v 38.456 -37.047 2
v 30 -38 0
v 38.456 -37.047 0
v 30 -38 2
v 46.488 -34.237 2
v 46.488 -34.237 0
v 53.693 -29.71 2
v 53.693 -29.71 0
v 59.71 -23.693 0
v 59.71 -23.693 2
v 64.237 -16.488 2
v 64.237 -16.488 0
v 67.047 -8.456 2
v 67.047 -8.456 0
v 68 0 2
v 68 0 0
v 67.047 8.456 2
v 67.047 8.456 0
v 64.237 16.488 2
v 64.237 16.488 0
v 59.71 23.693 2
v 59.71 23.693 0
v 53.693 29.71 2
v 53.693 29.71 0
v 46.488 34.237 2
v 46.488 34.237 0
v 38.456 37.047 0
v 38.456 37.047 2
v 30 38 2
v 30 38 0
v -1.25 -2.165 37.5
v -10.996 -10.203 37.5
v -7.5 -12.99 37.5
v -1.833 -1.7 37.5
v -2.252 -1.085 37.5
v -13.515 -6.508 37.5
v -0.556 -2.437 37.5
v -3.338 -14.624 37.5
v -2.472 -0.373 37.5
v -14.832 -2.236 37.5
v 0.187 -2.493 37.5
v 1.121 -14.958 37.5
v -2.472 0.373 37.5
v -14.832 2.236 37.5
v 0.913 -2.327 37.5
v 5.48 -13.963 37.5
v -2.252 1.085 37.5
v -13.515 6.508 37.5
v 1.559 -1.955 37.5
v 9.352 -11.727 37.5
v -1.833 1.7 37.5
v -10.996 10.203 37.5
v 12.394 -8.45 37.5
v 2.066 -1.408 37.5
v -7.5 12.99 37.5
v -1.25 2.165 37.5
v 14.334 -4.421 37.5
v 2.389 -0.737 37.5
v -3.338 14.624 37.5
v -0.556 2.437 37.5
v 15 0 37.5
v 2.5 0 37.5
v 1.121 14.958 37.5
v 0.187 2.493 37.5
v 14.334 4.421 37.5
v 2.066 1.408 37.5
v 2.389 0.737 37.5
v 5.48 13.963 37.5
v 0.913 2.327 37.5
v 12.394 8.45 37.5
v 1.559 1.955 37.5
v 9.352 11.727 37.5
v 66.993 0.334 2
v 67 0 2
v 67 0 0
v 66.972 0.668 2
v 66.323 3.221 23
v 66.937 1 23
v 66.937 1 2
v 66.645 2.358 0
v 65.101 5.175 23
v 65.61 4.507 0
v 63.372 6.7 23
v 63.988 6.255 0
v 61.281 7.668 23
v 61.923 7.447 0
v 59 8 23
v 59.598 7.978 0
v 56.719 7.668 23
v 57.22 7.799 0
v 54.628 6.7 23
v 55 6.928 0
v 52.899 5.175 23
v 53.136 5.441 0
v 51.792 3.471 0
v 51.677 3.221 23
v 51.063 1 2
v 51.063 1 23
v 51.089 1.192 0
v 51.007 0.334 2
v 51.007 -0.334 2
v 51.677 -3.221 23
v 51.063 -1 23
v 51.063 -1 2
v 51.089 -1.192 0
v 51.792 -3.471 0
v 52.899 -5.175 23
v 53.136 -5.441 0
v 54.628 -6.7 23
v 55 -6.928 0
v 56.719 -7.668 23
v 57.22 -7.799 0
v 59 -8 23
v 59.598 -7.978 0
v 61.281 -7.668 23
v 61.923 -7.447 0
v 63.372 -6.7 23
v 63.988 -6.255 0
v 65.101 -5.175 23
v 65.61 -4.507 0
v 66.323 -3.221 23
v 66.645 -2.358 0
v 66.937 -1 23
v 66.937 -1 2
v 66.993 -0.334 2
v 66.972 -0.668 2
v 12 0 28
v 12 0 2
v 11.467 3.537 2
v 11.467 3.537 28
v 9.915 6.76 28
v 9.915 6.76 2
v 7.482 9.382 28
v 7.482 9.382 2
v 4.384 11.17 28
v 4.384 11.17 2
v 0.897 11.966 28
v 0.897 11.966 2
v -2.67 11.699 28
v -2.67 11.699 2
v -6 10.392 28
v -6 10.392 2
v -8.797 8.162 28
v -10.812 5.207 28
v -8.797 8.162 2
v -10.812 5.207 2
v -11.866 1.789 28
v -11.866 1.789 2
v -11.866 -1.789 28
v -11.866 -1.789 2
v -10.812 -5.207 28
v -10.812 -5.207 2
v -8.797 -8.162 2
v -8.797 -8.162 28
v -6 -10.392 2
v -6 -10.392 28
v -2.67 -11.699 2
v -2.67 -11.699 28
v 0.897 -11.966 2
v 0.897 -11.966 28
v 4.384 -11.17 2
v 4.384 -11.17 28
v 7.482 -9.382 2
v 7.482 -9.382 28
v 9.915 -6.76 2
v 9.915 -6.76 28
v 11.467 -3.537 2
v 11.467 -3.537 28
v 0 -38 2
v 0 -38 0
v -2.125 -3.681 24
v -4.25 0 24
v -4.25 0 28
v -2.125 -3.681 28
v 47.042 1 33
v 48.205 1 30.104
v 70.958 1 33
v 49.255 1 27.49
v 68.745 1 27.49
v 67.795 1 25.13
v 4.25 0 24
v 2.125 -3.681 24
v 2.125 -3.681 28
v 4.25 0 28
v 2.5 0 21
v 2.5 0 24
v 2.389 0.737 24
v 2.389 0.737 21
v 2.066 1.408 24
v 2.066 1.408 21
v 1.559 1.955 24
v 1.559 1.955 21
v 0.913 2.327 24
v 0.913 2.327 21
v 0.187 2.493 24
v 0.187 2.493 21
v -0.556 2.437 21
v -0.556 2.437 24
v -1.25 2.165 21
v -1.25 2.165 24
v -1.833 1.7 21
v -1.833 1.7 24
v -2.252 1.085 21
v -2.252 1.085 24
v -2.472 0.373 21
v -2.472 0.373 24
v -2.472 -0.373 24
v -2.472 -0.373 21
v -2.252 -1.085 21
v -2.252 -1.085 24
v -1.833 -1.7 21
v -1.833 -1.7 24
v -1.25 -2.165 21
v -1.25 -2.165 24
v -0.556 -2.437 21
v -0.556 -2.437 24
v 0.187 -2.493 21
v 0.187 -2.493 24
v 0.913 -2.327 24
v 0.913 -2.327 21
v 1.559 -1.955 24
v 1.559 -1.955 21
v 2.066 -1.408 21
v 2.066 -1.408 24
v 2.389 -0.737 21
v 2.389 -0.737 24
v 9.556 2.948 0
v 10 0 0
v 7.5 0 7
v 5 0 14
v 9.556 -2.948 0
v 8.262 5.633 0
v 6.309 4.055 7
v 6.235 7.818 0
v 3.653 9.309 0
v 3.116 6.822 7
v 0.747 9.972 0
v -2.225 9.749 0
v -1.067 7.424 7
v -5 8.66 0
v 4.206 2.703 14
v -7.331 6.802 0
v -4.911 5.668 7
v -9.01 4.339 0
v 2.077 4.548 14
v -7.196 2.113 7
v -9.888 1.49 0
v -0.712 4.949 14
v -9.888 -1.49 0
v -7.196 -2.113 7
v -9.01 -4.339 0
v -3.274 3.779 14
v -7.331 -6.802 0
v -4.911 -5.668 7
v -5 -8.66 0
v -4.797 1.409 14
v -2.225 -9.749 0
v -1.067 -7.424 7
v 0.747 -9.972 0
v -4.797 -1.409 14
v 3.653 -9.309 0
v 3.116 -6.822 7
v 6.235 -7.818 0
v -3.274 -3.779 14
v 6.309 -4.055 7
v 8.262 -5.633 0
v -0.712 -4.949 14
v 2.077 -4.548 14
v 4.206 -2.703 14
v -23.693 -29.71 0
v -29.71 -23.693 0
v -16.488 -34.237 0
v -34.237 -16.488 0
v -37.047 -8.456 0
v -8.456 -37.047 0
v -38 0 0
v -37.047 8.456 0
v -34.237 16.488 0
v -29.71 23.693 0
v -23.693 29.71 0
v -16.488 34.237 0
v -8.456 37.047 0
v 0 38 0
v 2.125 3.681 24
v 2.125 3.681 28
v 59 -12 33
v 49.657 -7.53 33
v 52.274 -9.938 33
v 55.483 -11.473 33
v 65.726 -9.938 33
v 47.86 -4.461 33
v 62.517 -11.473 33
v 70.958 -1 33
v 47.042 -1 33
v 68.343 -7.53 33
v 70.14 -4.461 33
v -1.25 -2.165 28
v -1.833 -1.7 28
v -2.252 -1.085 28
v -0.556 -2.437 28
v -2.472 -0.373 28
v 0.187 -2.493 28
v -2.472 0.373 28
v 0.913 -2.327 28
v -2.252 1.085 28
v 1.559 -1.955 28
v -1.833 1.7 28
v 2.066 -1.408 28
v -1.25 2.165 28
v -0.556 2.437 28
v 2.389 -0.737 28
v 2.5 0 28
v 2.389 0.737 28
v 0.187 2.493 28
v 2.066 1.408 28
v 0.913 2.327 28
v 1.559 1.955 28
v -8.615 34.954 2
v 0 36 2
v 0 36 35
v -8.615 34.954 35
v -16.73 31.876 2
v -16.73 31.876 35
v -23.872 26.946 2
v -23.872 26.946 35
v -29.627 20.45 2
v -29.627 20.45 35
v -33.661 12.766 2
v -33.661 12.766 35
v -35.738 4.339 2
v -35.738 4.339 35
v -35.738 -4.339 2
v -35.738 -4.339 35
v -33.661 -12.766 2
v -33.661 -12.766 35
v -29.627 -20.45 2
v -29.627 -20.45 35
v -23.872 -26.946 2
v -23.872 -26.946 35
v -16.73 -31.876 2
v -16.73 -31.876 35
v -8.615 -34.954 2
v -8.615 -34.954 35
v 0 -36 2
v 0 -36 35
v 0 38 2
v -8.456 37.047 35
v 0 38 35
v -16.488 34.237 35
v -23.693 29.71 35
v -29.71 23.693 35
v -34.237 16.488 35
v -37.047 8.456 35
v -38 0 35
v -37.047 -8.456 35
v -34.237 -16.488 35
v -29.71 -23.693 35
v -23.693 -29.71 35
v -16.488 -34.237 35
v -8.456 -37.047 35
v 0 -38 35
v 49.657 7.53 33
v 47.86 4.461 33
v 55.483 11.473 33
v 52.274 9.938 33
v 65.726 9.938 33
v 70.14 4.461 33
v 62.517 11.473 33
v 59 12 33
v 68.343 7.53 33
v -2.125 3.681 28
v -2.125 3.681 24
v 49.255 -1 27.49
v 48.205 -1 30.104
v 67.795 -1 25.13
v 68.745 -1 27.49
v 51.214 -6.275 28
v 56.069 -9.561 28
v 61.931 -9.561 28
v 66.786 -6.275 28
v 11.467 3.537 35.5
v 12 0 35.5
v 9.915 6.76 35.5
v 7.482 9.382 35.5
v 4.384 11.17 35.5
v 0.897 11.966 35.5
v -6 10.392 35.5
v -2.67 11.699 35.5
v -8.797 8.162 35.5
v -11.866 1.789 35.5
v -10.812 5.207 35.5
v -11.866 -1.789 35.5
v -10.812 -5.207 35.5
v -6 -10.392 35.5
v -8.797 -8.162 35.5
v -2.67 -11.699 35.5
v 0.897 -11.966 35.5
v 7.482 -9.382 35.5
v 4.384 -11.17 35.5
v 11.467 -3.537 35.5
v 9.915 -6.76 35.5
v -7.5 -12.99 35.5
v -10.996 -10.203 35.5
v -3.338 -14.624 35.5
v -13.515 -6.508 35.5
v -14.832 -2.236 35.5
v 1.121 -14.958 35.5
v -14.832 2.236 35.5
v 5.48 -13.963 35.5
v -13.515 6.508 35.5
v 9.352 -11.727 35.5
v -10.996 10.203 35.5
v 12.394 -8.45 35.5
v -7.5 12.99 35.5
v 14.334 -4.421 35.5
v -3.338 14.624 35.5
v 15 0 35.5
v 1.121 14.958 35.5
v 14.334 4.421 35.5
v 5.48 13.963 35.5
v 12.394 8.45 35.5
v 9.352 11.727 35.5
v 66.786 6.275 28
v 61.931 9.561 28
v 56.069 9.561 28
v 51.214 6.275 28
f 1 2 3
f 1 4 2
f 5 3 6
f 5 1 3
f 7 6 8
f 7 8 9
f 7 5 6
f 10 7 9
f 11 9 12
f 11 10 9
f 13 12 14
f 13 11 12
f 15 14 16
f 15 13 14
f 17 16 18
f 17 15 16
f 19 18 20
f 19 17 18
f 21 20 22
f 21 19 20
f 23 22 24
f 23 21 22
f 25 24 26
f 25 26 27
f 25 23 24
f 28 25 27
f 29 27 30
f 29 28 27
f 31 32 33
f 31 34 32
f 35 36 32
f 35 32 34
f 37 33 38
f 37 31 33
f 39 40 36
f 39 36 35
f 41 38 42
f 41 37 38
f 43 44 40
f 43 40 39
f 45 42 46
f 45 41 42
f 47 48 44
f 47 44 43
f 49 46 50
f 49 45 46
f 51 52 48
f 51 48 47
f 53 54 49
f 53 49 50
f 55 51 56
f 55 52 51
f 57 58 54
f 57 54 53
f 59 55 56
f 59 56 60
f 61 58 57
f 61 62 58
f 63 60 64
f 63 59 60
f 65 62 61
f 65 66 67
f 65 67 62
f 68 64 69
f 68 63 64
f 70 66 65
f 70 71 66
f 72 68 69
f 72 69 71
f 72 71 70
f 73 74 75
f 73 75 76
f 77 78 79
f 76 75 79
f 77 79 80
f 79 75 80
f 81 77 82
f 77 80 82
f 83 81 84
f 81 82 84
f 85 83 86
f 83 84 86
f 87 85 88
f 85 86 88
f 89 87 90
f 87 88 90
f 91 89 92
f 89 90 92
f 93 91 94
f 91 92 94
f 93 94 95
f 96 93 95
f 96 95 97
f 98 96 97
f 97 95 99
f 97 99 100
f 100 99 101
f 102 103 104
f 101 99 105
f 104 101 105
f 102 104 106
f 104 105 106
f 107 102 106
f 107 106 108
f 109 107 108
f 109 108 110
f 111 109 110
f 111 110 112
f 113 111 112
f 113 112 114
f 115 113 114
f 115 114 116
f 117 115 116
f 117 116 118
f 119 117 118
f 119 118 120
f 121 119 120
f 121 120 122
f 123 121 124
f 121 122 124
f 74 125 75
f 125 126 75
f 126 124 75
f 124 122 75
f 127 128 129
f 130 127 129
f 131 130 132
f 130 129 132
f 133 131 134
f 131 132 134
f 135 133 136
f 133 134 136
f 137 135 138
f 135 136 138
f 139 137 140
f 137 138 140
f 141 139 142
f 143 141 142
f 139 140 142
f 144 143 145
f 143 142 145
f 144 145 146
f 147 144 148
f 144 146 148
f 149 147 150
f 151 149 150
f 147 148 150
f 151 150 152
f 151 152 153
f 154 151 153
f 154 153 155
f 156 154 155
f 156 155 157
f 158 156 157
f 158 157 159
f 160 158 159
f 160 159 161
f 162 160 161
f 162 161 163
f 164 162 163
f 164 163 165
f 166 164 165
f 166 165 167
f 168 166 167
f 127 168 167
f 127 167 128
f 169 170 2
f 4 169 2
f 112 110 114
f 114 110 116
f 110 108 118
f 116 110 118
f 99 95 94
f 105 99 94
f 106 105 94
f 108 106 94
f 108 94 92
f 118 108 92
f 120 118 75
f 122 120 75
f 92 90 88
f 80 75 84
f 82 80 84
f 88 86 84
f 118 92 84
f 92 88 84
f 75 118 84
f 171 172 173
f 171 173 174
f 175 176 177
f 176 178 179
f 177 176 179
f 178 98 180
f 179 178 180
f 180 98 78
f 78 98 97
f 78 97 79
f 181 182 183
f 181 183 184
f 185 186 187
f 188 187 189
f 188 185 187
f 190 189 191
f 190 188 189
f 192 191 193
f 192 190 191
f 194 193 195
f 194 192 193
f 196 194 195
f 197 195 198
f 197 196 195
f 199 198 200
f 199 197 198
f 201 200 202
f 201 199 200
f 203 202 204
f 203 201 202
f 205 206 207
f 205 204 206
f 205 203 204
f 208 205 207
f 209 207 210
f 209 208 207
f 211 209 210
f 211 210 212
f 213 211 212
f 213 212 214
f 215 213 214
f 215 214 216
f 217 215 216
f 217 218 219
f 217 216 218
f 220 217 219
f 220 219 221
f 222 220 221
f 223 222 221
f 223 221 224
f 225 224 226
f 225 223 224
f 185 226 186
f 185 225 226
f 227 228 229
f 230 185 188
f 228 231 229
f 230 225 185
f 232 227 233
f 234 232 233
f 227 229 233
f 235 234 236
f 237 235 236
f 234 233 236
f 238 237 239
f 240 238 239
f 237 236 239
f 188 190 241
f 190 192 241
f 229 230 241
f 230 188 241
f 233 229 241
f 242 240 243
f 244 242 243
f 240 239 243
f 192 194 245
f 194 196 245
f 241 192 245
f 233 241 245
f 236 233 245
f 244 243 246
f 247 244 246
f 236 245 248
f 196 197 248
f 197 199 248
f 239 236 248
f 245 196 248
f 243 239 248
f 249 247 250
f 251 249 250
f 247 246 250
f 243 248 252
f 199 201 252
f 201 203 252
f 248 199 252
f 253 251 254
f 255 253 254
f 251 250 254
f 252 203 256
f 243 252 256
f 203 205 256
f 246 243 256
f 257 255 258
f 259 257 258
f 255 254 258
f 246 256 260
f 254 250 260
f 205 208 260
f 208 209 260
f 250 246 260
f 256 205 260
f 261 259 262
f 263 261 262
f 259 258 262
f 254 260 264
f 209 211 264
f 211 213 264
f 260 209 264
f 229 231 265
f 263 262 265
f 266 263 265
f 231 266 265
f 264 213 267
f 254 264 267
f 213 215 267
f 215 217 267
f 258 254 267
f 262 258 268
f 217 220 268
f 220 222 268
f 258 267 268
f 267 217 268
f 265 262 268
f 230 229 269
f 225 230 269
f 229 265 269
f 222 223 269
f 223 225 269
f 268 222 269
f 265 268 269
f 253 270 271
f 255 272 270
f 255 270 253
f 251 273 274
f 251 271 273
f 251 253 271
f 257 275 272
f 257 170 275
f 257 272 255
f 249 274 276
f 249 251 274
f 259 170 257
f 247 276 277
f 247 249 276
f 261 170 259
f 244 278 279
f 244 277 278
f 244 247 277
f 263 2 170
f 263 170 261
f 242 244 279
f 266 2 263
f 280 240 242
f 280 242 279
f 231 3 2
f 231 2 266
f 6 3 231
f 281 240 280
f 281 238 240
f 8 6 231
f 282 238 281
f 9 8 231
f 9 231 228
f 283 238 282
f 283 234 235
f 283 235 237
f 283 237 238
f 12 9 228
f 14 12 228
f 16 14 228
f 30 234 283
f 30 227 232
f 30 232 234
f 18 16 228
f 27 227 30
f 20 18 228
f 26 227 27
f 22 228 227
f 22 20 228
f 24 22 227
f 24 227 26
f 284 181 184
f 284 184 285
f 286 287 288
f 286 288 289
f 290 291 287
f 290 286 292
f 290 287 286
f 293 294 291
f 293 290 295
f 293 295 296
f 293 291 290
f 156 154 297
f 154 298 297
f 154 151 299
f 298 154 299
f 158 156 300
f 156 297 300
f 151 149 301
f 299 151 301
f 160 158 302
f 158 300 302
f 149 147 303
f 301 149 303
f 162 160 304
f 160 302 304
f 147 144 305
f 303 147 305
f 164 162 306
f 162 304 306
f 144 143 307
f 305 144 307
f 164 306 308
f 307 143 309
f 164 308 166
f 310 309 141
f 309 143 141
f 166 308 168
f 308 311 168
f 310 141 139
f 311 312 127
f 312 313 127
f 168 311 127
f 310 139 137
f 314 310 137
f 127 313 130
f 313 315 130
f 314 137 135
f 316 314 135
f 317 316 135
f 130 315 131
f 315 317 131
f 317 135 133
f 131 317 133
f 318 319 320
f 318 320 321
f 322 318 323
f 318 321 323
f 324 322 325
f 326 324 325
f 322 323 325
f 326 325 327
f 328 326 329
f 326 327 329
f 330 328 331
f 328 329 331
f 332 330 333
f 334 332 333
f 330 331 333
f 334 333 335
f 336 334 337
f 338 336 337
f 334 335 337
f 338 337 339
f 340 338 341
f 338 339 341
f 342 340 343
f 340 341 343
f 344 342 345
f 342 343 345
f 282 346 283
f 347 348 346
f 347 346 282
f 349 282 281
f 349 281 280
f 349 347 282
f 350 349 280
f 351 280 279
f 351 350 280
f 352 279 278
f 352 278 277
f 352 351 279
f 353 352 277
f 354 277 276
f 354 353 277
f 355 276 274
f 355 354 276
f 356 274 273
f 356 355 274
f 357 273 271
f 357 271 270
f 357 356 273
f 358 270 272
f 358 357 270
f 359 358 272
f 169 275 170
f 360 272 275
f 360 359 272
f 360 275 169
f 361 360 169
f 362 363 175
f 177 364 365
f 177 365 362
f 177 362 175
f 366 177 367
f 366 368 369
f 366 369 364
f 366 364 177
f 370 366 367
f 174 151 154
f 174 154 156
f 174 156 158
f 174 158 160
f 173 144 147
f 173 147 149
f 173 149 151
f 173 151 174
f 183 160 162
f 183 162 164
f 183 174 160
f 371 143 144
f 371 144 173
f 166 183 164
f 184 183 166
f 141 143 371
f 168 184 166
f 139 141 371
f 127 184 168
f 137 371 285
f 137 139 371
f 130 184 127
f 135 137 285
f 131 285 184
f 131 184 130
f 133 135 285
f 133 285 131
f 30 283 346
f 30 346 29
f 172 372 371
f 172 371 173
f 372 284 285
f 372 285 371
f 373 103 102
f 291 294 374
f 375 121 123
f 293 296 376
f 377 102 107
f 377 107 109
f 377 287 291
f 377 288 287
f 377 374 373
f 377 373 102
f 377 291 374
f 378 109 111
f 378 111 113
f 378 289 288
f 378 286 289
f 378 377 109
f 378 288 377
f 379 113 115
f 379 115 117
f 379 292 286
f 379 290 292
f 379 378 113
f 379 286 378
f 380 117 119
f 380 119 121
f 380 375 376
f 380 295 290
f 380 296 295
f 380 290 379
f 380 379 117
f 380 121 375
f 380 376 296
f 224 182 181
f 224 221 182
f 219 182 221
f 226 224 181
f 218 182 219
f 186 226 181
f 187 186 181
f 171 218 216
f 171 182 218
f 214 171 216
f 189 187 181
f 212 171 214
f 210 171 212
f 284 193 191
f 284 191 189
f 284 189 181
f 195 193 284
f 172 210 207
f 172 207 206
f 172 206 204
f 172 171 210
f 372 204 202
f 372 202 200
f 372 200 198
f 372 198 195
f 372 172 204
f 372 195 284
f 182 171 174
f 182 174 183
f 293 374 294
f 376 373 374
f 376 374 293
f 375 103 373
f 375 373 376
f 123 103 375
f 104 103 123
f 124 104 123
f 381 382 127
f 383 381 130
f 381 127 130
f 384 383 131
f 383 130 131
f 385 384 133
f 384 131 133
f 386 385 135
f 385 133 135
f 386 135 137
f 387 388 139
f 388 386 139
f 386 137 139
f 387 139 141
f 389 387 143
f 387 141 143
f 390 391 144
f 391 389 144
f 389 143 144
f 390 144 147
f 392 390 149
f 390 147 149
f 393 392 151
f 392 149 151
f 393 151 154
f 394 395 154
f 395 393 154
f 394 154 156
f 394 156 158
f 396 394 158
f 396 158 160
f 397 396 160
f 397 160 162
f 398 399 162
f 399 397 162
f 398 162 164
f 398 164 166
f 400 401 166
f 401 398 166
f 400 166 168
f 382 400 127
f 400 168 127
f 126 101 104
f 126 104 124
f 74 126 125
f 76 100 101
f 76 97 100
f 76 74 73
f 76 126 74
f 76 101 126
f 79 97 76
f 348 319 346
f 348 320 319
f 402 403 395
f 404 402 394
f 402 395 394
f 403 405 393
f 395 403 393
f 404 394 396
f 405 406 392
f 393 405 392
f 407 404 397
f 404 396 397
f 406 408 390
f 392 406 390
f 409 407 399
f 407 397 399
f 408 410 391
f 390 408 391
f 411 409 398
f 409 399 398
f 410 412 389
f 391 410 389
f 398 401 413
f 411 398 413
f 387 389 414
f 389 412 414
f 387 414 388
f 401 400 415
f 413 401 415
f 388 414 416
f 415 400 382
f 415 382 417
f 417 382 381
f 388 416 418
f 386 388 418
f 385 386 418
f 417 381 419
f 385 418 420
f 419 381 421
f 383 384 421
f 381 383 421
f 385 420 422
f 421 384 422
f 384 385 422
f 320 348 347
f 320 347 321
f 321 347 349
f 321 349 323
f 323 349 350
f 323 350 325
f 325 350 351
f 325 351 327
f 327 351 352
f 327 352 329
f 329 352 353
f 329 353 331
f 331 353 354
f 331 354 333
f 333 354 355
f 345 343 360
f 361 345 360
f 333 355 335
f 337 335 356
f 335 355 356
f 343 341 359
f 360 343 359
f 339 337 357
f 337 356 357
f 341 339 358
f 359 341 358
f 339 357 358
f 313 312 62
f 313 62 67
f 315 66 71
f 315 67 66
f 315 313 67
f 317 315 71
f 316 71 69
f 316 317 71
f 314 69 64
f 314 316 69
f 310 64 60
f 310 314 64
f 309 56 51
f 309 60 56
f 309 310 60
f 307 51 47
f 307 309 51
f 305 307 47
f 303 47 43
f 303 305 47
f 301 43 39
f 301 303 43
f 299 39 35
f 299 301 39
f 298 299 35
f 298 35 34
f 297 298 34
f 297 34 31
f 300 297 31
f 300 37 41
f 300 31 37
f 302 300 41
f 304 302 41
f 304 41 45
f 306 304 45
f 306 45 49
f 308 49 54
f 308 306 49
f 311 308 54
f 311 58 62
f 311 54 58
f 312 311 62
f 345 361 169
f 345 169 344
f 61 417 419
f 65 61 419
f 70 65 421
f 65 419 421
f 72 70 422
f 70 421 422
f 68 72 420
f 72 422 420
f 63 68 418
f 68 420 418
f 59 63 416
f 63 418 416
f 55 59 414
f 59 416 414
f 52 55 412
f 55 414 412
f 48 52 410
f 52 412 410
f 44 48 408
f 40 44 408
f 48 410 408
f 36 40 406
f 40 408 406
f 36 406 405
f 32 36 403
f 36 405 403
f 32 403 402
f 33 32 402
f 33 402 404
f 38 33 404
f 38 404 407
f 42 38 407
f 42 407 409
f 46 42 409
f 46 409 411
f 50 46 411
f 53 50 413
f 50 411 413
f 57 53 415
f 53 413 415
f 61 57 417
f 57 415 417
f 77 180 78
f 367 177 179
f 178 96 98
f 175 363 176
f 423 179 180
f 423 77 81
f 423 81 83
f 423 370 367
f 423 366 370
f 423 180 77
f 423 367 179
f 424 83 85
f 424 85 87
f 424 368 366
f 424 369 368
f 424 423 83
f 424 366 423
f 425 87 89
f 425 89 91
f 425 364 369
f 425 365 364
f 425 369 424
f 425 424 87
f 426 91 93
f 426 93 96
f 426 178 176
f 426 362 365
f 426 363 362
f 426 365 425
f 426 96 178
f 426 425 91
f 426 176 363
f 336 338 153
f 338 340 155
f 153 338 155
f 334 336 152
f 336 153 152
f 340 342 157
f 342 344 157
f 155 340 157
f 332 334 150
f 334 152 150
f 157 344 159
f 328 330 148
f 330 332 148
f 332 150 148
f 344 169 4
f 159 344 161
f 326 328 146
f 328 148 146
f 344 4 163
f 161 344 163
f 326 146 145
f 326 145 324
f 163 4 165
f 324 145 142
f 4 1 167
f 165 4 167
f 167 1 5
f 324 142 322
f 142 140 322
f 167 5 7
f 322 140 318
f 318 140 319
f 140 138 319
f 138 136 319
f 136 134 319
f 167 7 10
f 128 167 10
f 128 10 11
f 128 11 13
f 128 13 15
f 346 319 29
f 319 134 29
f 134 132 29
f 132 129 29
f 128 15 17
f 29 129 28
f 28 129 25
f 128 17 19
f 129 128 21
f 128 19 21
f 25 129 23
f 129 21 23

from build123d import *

# Parameters (mm, degrees)
EXTRUDE_DEPTH     = 4
CYLINDER004_R     = 2.5
CYLINDER004_DEPTH = 30
BOX_W             = 30
BOX_H             = 76
BOX_DEPTH         = 2
CYLINDER003_W     = 36
CYLINDER003_H     = 35
CYLINDER003_ANGLE = 180
CYLINDER_W        = 38
CYLINDER_H        = 35
CYLINDER_ANGLE    = 180
CYLINDER005_W     = 38
CYLINDER005_H     = 2
CYLINDER005_ANGLE = 180
CYLINDER001_R     = 12
CYLINDER001_DEPTH = 28
BOX001_W          = 30
BOX001_H          = 2
BOX001_DEPTH      = 35
CYLINDER002_R     = 8
CYLINDER002_DEPTH = 32
CYLINDER007_R     = 2.5
CYLINDER007_DEPTH = 30
CYLINDER006_R     = 12
CYLINDER006_DEPTH = 9
CYLINDER008_R     = 15
CYLINDER008_DEPTH = 2


with BuildPart() as cone:
    # Cone → Cone (revolve)
    with BuildSketch(Plane.XZ):
        Polygon((0, 0), (10, 0), (2.5, 21), (0, 21), align=None)
    revolve(axis=Axis((0, 0, 0), (0, 0, 1)))


with BuildPart() as nut_extrude:
    # RegularPolygon → Extrude (new body)
    with BuildSketch(Plane(origin=(0, 0, 0), x_dir=(0, 1, 0), z_dir=(0, 0, 1))):
        Polygon((0, -4.25), (3.680608, -2.125), (3.680608, 2.125), (0, 4.25), (-3.680608, 2.125), (-3.680608, -2.125), align=None)
    extrude(amount=EXTRUDE_DEPTH)


with BuildPart() as nut_extrude_1:
    # Extrude placement: moved
    add(nut_extrude.part.moved(Location((0, 0, 24))))


with BuildPart() as central_hole_fusion:
    # Cylinder004 → Cylinder004 (new body)
    with BuildSketch(Plane.XY):
        Circle(CYLINDER004_R)
    extrude(amount=CYLINDER004_DEPTH)

    # Fusion: union Cone, nut extrude
    add(cone.part)
    add(nut_extrude_1.part)


with BuildPart() as bottom_cube:
    # Box → Box (new body)
    with BuildSketch(Plane(origin=(0, -38, 0), x_dir=(1, 0, 0), z_dir=(0, 0, 1))):
        with Locations((15, 38)):
            Rectangle(BOX_W, BOX_H)
    extrude(amount=BOX_DEPTH)


with BuildPart() as extraction_cylinder:
    # Cylinder003 → Cylinder003 (revolve)
    with BuildSketch(Plane(origin=(0, 0, 2), x_dir=(0, 1, 0), z_dir=(1, 0, 0))):
        with Locations((18, 17.5)):
            Rectangle(CYLINDER003_W, CYLINDER003_H)
    revolve(axis=Axis((0, 0, 2), (0, 0, 1)), revolution_arc=CYLINDER003_ANGLE)


with BuildPart() as outer_bottom_cylinder_cut:
    # Cylinder → Cylinder (revolve)
    with BuildSketch(Plane.YZ):
        with Locations((19, 17.5)):
            Rectangle(CYLINDER_W, CYLINDER_H)
    revolve(axis=Axis((0, 0, 0), (0, 0, 1)), revolution_arc=CYLINDER_ANGLE)

    # Cut: cut extraction cylinder
    add(extraction_cylinder.part, mode=Mode.SUBTRACT)


with BuildPart() as other_side_cylinder:
    # Cylinder005 → Cylinder005 (revolve)
    with BuildSketch(Plane(origin=(30, 0, 0), x_dir=(0, -1, 0), z_dir=(-1, 0, 0))):
        with Locations((19, 1)):
            Rectangle(CYLINDER005_W, CYLINDER005_H)
    revolve(axis=Axis((30, 0, 0), (0, 0, 1)), revolution_arc=CYLINDER005_ANGLE)


with BuildPart() as drum_cut:
    # Cylinder001 → Cylinder001 (new body)
    with BuildSketch(Plane.XY):
        Circle(CYLINDER001_R)
    extrude(amount=CYLINDER001_DEPTH)

    # Fusion001: union bottom cube, outer bottom cylinder cut, other side cylinder
    add(bottom_cube.part)
    add(outer_bottom_cylinder_cut.part)
    add(other_side_cylinder.part)

    # Cut001: cut central hole fusion
    add(central_hole_fusion.part, mode=Mode.SUBTRACT)


with BuildPart() as cut_cube:
    # Box001 → Box001 (new body)
    with BuildSketch(Plane(origin=(43, -1, 2), x_dir=(1, 0, 0), z_dir=(0, 0, 1))):
        with Locations((15, 1)):
            Rectangle(BOX001_W, BOX001_H)
    extrude(amount=BOX001_DEPTH)


with BuildPart() as other_wire_cylinder:
    # Cylinder002 → Cylinder002 (new body)
    with BuildSketch(Plane(origin=(59, 0, 0), x_dir=(1, 0, 0), z_dir=(0, 0, 1))):
        Circle(CYLINDER002_R)
    extrude(amount=CYLINDER002_DEPTH)


with BuildPart() as other_wire_cut:
    # Cone001 → Cone001 (revolve)
    with BuildSketch(Plane(origin=(59, 0, 23), x_dir=(1, 0, 0), z_dir=(0, -1, 0))):
        Polygon((0, 0), (8, 0), (12, 10), (0, 10), align=None)
    revolve(axis=Axis((59, 0, 23), (0, 0, 1)))

    # Fusion002: union other wire cylinder
    add(other_wire_cylinder.part)

    # Cut002: cut cut cube
    add(cut_cube.part, mode=Mode.SUBTRACT)


with BuildPart() as top_center_hole:
    # Cylinder007 → Cylinder007 (new body)
    with BuildSketch(Plane.XY.offset(17)):
        Circle(CYLINDER007_R)
    extrude(amount=CYLINDER007_DEPTH)


with BuildPart() as top_center_cylinder:
    # Cylinder006 → Cylinder006 (new body)
    with BuildSketch(Plane.XY.offset(28)):
        Circle(CYLINDER006_R)
    extrude(amount=CYLINDER006_DEPTH)


with BuildPart() as top_part_cut:
    # Cylinder008 → Cylinder008 (new body)
    with BuildSketch(Plane.XY.offset(35.5)):
        Circle(CYLINDER008_R)
    extrude(amount=CYLINDER008_DEPTH)

    # Fusion003: union top center cylinder
    add(top_center_cylinder.part)

    # Cut003: cut top center hole
    add(top_center_hole.part, mode=Mode.SUBTRACT)


solid = Compound([drum_cut.part, other_wire_cut.part, top_part_cut.part])
